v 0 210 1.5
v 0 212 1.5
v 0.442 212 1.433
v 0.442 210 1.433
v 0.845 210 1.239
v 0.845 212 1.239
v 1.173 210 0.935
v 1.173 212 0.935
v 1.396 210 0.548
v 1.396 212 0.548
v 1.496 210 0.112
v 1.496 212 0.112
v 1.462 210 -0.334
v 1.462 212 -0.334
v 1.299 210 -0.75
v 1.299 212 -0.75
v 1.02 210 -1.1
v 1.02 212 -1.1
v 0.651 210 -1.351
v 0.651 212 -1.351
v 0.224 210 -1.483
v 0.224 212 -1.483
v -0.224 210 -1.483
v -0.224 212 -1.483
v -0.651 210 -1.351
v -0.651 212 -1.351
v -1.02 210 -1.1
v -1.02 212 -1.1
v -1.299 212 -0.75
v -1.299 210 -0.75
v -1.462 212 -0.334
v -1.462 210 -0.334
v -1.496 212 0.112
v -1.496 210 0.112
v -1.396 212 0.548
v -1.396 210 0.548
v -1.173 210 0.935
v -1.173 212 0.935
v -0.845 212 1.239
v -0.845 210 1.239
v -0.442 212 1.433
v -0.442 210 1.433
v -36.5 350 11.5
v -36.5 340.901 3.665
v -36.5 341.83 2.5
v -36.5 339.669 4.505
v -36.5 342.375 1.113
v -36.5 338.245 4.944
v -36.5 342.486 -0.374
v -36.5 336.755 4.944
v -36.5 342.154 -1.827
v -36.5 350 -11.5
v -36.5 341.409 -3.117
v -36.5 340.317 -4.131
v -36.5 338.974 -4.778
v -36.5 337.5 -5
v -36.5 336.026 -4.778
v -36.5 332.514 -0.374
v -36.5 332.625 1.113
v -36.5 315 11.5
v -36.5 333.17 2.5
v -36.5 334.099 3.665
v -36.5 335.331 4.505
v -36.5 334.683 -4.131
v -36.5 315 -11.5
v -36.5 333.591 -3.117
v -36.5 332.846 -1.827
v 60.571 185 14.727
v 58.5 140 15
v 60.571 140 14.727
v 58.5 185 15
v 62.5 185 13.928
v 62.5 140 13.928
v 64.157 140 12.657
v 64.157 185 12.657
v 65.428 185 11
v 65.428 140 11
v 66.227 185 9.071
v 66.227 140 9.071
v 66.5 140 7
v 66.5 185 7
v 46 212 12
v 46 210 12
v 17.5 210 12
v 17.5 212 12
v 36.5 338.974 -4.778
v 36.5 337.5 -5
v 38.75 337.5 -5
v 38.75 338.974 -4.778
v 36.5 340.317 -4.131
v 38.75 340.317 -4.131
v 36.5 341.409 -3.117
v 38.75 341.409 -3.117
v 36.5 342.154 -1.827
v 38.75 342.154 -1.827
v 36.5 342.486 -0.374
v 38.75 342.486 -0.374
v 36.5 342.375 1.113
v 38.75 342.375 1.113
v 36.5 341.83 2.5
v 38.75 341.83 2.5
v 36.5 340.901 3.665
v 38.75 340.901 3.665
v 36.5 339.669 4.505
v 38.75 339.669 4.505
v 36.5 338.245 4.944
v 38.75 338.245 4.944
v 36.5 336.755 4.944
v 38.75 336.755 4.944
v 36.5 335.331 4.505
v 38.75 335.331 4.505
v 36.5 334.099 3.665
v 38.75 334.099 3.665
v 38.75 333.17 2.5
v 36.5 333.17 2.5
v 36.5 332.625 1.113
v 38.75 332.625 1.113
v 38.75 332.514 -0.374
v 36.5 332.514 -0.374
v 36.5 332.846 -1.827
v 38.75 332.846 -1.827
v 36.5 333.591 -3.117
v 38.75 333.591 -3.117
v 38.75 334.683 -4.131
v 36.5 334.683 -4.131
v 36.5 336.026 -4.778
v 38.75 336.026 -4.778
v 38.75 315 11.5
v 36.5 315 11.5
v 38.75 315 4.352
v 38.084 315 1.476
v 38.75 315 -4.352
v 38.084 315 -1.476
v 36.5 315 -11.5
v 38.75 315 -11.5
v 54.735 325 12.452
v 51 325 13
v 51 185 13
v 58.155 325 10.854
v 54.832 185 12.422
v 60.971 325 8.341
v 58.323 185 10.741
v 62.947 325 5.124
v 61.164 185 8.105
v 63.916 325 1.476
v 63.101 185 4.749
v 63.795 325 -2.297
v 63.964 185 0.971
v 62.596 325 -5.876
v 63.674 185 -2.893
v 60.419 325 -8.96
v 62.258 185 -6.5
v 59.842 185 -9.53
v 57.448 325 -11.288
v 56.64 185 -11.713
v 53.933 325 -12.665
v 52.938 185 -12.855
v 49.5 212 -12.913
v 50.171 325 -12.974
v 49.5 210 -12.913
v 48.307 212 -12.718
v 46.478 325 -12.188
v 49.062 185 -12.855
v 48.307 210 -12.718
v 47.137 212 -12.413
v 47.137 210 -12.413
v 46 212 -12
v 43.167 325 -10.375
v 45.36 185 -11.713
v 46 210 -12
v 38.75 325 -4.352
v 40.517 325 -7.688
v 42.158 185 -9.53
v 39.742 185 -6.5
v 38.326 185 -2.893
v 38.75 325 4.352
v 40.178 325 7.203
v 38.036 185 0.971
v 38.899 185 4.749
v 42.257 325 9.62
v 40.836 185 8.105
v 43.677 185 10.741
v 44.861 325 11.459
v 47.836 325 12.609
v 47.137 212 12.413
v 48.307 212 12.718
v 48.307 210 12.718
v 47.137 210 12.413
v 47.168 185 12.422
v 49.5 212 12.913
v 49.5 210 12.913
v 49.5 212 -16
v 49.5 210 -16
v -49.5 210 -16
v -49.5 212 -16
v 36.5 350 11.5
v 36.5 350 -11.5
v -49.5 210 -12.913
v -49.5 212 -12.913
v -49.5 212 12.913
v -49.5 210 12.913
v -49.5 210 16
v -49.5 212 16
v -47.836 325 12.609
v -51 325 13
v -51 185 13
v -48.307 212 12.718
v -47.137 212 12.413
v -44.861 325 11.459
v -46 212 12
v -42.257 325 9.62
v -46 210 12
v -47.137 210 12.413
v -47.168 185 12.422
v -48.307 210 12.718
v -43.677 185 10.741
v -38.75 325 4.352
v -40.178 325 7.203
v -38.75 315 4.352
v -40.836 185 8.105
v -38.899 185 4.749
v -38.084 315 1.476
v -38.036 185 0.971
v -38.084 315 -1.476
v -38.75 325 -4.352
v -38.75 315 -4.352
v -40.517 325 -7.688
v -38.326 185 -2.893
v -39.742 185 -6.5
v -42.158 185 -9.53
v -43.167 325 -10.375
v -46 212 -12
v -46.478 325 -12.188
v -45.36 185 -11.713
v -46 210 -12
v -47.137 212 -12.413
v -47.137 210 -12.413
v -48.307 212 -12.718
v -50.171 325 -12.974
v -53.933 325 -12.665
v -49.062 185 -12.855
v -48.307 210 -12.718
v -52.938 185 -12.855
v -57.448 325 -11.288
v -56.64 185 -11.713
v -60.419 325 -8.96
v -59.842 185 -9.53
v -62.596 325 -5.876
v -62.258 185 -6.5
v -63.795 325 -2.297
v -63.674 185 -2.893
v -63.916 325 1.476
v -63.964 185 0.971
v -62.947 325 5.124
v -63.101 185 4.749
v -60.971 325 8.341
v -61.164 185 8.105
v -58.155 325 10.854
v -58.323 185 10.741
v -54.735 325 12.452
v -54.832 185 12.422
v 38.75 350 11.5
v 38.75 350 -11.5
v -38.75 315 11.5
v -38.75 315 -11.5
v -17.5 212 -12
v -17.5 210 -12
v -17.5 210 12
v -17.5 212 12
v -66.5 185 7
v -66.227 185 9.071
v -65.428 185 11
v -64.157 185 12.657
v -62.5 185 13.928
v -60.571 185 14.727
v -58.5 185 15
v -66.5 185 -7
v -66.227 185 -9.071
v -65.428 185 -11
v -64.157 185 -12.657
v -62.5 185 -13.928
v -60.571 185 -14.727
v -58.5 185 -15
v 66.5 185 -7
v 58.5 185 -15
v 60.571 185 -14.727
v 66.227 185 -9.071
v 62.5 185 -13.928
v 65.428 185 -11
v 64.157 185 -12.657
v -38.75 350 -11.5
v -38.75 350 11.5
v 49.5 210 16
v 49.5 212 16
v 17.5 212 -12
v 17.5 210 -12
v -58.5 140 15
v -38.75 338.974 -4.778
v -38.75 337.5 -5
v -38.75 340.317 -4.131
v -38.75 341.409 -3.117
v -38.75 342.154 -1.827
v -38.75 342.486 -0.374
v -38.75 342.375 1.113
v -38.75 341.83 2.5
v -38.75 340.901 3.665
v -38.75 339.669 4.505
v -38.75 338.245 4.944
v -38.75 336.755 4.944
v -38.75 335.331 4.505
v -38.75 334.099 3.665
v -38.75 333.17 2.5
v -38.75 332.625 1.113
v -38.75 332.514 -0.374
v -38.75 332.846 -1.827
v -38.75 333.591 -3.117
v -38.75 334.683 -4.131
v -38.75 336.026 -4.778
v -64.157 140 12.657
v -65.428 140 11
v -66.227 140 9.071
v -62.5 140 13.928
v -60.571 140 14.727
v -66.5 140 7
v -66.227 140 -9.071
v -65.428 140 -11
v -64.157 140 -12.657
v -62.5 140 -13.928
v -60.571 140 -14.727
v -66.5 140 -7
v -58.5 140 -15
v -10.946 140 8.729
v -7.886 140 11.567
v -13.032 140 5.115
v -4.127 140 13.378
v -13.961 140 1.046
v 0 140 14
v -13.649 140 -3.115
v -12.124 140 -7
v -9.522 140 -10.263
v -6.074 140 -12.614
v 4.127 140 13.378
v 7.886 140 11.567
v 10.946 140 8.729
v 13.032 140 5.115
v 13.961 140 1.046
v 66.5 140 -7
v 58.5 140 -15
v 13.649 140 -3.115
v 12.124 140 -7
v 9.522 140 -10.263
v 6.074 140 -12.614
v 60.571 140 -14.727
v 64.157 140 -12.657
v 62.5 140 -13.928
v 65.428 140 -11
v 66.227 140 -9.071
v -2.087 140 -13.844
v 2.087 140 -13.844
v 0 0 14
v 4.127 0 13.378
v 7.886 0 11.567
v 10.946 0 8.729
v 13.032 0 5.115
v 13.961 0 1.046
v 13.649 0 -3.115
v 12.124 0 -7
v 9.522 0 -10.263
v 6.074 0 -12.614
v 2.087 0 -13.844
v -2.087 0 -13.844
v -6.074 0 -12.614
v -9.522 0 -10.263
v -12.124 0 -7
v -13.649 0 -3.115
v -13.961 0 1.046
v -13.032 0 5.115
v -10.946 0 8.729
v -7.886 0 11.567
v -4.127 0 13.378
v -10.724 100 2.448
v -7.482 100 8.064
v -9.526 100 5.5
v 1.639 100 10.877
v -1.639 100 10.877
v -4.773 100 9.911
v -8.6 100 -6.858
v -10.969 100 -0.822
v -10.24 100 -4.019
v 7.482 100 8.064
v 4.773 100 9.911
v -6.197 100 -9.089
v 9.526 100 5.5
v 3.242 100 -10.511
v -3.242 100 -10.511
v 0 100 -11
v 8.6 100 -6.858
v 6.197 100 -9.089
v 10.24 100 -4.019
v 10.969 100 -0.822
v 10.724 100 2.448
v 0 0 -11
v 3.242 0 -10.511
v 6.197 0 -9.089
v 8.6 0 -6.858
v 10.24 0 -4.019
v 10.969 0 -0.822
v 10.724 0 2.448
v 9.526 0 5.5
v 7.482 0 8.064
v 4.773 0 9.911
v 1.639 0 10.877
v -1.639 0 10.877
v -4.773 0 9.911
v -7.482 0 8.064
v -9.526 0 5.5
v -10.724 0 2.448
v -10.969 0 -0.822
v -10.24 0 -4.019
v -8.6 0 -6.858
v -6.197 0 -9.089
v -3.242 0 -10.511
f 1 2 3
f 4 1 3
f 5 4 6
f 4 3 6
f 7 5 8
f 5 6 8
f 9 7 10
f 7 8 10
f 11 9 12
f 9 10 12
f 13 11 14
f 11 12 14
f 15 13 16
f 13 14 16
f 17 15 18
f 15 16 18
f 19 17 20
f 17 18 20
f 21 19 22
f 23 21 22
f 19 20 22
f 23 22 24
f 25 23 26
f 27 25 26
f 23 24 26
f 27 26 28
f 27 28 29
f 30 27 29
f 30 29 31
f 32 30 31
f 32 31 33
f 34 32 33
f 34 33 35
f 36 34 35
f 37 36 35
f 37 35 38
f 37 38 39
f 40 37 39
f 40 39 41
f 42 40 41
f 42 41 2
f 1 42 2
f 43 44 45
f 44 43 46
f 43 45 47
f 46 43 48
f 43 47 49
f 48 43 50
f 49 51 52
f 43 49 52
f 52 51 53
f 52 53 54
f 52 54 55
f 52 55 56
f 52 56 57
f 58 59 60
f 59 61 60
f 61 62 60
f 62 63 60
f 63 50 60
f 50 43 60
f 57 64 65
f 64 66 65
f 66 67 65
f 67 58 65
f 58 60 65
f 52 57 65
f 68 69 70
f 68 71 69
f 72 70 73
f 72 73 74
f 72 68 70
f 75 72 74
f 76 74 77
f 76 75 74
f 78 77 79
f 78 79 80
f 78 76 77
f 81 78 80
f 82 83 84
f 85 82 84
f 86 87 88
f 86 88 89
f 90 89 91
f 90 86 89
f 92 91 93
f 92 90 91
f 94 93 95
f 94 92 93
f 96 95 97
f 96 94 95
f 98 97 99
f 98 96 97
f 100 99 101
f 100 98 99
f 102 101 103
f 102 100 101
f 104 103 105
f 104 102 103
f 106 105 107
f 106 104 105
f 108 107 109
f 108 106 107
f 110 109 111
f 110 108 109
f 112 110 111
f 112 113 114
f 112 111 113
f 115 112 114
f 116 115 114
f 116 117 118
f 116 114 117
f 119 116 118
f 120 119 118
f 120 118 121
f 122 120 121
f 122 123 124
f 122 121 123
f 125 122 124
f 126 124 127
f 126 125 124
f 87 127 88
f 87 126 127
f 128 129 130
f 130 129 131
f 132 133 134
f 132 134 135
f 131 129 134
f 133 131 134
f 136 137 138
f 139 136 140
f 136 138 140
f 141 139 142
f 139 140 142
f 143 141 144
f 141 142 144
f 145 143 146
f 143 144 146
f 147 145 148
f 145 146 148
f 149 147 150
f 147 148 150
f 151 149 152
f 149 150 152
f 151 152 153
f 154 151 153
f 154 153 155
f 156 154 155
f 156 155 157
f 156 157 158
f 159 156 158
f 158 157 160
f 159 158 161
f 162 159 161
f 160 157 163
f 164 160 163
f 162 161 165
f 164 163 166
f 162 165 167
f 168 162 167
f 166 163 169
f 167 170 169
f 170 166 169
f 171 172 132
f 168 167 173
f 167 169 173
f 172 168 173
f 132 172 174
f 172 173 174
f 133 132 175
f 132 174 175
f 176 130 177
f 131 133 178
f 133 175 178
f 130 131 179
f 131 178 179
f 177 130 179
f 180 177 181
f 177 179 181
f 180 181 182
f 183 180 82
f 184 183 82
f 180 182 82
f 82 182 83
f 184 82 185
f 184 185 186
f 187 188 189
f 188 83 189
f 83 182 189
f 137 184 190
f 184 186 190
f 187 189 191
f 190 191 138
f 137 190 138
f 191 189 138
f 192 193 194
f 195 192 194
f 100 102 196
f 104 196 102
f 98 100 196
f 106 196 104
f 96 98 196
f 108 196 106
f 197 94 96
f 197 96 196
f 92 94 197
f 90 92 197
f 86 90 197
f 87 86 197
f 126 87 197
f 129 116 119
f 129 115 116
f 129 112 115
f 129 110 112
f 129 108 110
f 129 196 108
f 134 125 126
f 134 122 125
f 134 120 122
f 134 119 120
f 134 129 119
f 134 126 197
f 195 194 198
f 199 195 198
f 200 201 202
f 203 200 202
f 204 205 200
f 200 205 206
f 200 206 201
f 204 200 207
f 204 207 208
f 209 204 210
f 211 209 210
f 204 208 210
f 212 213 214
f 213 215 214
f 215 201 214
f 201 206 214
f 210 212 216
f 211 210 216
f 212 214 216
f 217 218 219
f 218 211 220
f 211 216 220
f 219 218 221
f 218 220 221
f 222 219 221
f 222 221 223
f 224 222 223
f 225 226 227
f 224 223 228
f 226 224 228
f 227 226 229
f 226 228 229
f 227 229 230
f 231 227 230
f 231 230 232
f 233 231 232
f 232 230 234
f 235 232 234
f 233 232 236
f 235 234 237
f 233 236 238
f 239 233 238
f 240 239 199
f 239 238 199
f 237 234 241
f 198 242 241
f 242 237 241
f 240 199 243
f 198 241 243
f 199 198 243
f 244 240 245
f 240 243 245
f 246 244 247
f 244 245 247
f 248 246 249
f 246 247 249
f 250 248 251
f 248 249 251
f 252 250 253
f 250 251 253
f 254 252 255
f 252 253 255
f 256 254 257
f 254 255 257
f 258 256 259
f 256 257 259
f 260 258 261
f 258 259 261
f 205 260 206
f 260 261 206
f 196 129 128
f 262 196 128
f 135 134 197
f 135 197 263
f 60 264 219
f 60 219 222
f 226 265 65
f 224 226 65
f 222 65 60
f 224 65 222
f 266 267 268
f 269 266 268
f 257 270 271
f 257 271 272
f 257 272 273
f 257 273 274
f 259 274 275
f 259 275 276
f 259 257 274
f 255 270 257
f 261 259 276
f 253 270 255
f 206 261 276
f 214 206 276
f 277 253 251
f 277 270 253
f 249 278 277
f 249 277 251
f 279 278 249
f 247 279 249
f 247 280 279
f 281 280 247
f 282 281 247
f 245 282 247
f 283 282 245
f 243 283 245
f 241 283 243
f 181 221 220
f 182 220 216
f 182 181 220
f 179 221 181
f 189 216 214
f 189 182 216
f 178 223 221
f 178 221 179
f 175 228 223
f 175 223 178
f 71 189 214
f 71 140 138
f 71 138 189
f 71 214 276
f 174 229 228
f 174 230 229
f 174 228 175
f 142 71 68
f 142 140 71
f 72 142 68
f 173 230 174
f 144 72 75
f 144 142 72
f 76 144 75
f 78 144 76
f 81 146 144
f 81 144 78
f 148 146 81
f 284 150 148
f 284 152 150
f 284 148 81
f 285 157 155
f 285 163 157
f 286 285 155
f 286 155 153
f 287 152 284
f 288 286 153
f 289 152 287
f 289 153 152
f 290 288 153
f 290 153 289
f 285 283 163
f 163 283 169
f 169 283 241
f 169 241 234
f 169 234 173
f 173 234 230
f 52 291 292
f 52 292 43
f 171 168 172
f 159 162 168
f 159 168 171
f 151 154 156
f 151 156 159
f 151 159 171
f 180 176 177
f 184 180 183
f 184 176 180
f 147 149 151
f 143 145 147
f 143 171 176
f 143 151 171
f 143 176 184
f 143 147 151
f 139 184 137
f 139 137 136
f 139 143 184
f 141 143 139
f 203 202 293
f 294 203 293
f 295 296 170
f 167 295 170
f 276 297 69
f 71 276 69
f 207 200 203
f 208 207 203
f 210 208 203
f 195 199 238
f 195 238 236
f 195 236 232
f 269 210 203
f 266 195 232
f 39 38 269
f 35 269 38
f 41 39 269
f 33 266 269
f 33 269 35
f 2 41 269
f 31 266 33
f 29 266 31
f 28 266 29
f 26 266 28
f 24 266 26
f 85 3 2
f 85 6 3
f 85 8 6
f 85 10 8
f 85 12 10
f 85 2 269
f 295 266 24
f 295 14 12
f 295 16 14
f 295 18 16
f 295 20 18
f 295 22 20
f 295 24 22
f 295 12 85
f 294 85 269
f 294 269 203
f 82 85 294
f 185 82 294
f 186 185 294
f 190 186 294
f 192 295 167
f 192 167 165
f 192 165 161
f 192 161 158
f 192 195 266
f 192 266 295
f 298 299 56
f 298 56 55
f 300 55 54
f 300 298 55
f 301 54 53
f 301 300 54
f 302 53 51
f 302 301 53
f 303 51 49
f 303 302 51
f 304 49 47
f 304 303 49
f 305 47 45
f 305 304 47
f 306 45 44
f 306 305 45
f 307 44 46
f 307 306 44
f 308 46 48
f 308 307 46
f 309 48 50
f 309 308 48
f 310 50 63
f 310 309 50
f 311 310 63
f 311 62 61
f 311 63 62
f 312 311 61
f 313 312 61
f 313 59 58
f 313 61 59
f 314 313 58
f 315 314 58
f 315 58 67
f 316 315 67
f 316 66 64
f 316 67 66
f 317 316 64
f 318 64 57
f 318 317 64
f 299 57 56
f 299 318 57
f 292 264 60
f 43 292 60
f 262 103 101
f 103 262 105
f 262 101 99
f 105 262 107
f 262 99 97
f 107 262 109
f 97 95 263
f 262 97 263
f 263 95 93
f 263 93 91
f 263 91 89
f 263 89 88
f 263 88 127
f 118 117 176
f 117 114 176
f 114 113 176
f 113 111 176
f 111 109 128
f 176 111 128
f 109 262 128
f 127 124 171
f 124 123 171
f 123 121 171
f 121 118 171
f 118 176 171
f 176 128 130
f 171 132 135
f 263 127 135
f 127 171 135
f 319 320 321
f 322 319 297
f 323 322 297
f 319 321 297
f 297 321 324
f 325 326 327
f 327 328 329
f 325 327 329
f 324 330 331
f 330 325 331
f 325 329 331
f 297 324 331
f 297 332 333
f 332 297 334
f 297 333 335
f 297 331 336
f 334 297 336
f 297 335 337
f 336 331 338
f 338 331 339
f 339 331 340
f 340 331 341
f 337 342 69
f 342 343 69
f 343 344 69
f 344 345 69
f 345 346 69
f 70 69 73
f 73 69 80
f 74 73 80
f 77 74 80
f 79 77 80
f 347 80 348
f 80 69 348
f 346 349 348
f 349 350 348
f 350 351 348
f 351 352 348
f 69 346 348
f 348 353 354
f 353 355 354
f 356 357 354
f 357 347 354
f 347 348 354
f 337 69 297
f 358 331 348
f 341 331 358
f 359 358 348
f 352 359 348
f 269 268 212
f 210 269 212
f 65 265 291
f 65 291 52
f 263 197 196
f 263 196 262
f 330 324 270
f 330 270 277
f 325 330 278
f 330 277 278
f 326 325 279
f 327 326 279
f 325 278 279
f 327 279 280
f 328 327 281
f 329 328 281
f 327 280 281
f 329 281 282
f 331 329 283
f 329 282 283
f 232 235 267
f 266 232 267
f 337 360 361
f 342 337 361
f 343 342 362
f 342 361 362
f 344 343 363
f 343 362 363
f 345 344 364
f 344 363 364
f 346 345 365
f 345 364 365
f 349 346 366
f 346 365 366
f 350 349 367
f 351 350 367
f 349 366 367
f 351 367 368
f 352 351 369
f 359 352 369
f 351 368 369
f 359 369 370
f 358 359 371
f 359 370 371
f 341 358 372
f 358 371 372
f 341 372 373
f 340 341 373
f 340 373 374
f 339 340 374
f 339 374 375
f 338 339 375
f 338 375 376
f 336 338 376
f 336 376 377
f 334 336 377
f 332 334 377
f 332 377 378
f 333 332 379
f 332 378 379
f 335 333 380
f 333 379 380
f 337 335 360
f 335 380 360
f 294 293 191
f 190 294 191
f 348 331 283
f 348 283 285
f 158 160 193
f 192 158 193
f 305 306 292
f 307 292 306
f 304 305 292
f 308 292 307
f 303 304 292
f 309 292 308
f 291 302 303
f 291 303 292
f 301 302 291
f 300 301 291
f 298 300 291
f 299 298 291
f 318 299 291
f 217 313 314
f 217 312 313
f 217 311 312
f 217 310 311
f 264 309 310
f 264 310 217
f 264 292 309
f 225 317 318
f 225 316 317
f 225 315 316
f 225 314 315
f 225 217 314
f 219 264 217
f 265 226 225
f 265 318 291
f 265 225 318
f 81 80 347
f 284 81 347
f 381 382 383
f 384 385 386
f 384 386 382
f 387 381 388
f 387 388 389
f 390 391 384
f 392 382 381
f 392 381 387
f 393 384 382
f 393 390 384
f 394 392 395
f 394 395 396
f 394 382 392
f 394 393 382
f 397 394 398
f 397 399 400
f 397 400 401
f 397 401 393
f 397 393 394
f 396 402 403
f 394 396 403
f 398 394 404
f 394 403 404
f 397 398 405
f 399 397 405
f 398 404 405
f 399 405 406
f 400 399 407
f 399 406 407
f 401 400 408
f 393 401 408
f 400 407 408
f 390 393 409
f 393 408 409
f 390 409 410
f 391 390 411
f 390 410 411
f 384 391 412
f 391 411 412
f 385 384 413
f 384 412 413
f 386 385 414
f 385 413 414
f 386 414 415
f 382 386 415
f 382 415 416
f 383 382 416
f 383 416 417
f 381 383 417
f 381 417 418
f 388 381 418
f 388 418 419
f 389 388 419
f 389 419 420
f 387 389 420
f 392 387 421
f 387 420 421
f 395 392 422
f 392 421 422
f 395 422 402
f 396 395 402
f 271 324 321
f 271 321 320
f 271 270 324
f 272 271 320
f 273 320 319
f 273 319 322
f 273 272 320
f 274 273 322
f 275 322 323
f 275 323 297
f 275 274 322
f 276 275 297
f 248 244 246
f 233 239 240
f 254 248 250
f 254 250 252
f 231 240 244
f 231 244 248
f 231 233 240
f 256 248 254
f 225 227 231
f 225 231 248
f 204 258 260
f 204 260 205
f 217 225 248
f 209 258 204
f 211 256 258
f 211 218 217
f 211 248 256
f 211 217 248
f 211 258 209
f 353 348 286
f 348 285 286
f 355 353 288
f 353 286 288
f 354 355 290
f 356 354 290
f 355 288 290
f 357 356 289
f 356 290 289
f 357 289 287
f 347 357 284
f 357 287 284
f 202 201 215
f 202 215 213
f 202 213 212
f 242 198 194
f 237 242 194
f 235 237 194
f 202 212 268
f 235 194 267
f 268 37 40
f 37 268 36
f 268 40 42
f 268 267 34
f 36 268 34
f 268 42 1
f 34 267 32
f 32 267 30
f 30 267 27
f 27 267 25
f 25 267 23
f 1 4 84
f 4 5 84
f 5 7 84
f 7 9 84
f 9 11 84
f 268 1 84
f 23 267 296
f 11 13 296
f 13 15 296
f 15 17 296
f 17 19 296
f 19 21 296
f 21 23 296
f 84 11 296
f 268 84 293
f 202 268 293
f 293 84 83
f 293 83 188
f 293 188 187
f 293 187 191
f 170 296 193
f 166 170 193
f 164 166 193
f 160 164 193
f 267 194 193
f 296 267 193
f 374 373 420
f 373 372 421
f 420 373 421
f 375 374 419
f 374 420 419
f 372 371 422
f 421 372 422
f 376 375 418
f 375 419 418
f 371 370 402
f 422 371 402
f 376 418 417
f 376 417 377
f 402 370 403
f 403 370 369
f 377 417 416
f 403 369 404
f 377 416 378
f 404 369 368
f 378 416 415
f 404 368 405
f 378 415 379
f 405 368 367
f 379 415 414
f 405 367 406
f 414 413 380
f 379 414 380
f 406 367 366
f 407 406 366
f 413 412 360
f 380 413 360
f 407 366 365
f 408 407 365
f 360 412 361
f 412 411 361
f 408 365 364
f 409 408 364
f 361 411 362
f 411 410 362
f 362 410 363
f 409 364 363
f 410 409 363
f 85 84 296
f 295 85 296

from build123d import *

# Parameters (mm, degrees)
SKETCH1_R               = 14
BOSS_EXTRUDE1_DEPTH     = 140
SKETCH2_W               = 133
SKETCH2_H               = 30
BOSS_EXTRUDE2_DEPTH     = 45
SKETCH3_R               = 13
BOSS_EXTRUDE3_DEPTH     = 140
FILLET1_R               = 8
BOSS_EXTRUDE4_START     = -10
SKETCH5_W               = 2.25
SKETCH5_H               = 23
BOSS_EXTRUDE4_DEPTH     = 35
CUT_EXTRUDE1_DEPTH      = 366.14928454
CUT_EXTRUDE1_DEPTH_BACK = 366.14928454
SKETCH6_R               = 5
BOSS_EXTRUDE5_START     = -140
BOSS_EXTRUDE5_DEPTH     = 2
CUT_EXTRUDE2_REACH      = 224.761
SKETCH9_R               = 1.5
SKETCH10_R              = 11
CUT_EXTRUDE3_DEPTH      = 100


with BuildPart() as part:
    # Sketch1 → Boss-Extrude1 (new body)
    with BuildSketch(Plane(origin=(0, 0, 0), x_dir=(1, 0, 0), z_dir=(0, 1, 0))):
        with Locations(Location((0, 0, 0), (0, 0, 270))):
            Circle(SKETCH1_R)
    extrude(amount=BOSS_EXTRUDE1_DEPTH)

    # Sketch2 → Boss-Extrude2 (add)
    with BuildSketch(Plane(origin=(0, 140, 0), x_dir=(1, 0, 0), z_dir=(0, 1, 0))):
        Rectangle(SKETCH2_W, SKETCH2_H)
    extrude(amount=BOSS_EXTRUDE2_DEPTH)

    # Sketch3 → Boss-Extrude3 (add)
    with BuildSketch(Plane(origin=(0, 185, 0), x_dir=(1, 0, 0), z_dir=(0, 1, 0))):
        with Locations(Location((-51, 0, 0), (0, 0, 270))):
            Circle(SKETCH3_R)
        with Locations(Location((51, 0, 0), (0, 0, 270))):
            Circle(SKETCH3_R)
    extrude(amount=BOSS_EXTRUDE3_DEPTH)

    # Fillet1
    fillet1_edges = [part.edges().sort_by_distance(p)[0] for p in [
        (-66.5, 162.5, 15),
        (66.5, 162.5, 15),
        (66.5, 162.5, -15),
        (-66.5, 162.5, -15),
    ]]
    fillet(fillet1_edges, radius=FILLET1_R)

    # Sketch5 → Boss-Extrude4 (add)
    with BuildSketch(Plane(origin=(0, 325, 0), x_dir=(1, 0, 0), z_dir=(0, 1, 0)).offset(BOSS_EXTRUDE4_START)):
        with Locations((-37.625, 0)):
            Rectangle(SKETCH5_W, SKETCH5_H)
        with Locations((37.625, 0)):
            Rectangle(SKETCH5_W, SKETCH5_H)
    extrude(amount=BOSS_EXTRUDE4_DEPTH)

    # Sketch6 → Cut-Extrude1 (cut, two sides: drawn at the far end of the back side and taken through both)
    with BuildSketch(Plane(origin=(-36.5, 0, 0), x_dir=(0, 0, -1), z_dir=(1, 0, 0)).offset(-CUT_EXTRUDE1_DEPTH_BACK)):
        with Locations((0, 337.5)):
            Circle(SKETCH6_R)
    extrude(amount=CUT_EXTRUDE1_DEPTH + CUT_EXTRUDE1_DEPTH_BACK, mode=Mode.SUBTRACT)

    # Sketch8 → Boss-Extrude5 (add)
    with BuildSketch(Plane(origin=(0, 350, 0), x_dir=(1, 0, 0), z_dir=(0, 1, 0)).offset(BOSS_EXTRUDE5_START)):
        Polygon((17.5, 16), (-17.5, 16), (-49.5, 16), (-49.5, 12), (-17.5, 12), (-17.5, -12), (-49.5, -12), (-49.5, -16), (-17.5, -16), (17.5, -16), (49.5, -16), (49.5, -12), (17.5, -12), (17.5, 12), (49.5, 12), (49.5, 16), align=None)
    extrude(amount=BOSS_EXTRUDE5_DEPTH)

    # Sketch9 → Cut-Extrude2 (cut, up to next)
    with BuildSketch(Plane(origin=(0, 212, 0), x_dir=(1, 0, 0), z_dir=(0, 1, 0)), mode=Mode.PRIVATE) as cut_extrude2_sk1:
        with Locations(Location((0, 0, 0), (0, 0, 270))):
            Circle(SKETCH9_R)
    cut_extrude2_tool1 = extrude(cut_extrude2_sk1.sketch, amount=-CUT_EXTRUDE2_REACH, mode=Mode.PRIVATE) & part.part
    add(cut_extrude2_tool1.solids().sort_by_distance((0, 212, 0))[0], mode=Mode.SUBTRACT)

    # Sketch10 → Cut-Extrude3 (cut)
    with BuildSketch(Plane.XZ):
        with Locations(Location((0, 0, 0), (0, 0, 270))):
            Circle(SKETCH10_R)
    extrude(amount=-CUT_EXTRUDE3_DEPTH, mode=Mode.SUBTRACT)


solid = part.part
